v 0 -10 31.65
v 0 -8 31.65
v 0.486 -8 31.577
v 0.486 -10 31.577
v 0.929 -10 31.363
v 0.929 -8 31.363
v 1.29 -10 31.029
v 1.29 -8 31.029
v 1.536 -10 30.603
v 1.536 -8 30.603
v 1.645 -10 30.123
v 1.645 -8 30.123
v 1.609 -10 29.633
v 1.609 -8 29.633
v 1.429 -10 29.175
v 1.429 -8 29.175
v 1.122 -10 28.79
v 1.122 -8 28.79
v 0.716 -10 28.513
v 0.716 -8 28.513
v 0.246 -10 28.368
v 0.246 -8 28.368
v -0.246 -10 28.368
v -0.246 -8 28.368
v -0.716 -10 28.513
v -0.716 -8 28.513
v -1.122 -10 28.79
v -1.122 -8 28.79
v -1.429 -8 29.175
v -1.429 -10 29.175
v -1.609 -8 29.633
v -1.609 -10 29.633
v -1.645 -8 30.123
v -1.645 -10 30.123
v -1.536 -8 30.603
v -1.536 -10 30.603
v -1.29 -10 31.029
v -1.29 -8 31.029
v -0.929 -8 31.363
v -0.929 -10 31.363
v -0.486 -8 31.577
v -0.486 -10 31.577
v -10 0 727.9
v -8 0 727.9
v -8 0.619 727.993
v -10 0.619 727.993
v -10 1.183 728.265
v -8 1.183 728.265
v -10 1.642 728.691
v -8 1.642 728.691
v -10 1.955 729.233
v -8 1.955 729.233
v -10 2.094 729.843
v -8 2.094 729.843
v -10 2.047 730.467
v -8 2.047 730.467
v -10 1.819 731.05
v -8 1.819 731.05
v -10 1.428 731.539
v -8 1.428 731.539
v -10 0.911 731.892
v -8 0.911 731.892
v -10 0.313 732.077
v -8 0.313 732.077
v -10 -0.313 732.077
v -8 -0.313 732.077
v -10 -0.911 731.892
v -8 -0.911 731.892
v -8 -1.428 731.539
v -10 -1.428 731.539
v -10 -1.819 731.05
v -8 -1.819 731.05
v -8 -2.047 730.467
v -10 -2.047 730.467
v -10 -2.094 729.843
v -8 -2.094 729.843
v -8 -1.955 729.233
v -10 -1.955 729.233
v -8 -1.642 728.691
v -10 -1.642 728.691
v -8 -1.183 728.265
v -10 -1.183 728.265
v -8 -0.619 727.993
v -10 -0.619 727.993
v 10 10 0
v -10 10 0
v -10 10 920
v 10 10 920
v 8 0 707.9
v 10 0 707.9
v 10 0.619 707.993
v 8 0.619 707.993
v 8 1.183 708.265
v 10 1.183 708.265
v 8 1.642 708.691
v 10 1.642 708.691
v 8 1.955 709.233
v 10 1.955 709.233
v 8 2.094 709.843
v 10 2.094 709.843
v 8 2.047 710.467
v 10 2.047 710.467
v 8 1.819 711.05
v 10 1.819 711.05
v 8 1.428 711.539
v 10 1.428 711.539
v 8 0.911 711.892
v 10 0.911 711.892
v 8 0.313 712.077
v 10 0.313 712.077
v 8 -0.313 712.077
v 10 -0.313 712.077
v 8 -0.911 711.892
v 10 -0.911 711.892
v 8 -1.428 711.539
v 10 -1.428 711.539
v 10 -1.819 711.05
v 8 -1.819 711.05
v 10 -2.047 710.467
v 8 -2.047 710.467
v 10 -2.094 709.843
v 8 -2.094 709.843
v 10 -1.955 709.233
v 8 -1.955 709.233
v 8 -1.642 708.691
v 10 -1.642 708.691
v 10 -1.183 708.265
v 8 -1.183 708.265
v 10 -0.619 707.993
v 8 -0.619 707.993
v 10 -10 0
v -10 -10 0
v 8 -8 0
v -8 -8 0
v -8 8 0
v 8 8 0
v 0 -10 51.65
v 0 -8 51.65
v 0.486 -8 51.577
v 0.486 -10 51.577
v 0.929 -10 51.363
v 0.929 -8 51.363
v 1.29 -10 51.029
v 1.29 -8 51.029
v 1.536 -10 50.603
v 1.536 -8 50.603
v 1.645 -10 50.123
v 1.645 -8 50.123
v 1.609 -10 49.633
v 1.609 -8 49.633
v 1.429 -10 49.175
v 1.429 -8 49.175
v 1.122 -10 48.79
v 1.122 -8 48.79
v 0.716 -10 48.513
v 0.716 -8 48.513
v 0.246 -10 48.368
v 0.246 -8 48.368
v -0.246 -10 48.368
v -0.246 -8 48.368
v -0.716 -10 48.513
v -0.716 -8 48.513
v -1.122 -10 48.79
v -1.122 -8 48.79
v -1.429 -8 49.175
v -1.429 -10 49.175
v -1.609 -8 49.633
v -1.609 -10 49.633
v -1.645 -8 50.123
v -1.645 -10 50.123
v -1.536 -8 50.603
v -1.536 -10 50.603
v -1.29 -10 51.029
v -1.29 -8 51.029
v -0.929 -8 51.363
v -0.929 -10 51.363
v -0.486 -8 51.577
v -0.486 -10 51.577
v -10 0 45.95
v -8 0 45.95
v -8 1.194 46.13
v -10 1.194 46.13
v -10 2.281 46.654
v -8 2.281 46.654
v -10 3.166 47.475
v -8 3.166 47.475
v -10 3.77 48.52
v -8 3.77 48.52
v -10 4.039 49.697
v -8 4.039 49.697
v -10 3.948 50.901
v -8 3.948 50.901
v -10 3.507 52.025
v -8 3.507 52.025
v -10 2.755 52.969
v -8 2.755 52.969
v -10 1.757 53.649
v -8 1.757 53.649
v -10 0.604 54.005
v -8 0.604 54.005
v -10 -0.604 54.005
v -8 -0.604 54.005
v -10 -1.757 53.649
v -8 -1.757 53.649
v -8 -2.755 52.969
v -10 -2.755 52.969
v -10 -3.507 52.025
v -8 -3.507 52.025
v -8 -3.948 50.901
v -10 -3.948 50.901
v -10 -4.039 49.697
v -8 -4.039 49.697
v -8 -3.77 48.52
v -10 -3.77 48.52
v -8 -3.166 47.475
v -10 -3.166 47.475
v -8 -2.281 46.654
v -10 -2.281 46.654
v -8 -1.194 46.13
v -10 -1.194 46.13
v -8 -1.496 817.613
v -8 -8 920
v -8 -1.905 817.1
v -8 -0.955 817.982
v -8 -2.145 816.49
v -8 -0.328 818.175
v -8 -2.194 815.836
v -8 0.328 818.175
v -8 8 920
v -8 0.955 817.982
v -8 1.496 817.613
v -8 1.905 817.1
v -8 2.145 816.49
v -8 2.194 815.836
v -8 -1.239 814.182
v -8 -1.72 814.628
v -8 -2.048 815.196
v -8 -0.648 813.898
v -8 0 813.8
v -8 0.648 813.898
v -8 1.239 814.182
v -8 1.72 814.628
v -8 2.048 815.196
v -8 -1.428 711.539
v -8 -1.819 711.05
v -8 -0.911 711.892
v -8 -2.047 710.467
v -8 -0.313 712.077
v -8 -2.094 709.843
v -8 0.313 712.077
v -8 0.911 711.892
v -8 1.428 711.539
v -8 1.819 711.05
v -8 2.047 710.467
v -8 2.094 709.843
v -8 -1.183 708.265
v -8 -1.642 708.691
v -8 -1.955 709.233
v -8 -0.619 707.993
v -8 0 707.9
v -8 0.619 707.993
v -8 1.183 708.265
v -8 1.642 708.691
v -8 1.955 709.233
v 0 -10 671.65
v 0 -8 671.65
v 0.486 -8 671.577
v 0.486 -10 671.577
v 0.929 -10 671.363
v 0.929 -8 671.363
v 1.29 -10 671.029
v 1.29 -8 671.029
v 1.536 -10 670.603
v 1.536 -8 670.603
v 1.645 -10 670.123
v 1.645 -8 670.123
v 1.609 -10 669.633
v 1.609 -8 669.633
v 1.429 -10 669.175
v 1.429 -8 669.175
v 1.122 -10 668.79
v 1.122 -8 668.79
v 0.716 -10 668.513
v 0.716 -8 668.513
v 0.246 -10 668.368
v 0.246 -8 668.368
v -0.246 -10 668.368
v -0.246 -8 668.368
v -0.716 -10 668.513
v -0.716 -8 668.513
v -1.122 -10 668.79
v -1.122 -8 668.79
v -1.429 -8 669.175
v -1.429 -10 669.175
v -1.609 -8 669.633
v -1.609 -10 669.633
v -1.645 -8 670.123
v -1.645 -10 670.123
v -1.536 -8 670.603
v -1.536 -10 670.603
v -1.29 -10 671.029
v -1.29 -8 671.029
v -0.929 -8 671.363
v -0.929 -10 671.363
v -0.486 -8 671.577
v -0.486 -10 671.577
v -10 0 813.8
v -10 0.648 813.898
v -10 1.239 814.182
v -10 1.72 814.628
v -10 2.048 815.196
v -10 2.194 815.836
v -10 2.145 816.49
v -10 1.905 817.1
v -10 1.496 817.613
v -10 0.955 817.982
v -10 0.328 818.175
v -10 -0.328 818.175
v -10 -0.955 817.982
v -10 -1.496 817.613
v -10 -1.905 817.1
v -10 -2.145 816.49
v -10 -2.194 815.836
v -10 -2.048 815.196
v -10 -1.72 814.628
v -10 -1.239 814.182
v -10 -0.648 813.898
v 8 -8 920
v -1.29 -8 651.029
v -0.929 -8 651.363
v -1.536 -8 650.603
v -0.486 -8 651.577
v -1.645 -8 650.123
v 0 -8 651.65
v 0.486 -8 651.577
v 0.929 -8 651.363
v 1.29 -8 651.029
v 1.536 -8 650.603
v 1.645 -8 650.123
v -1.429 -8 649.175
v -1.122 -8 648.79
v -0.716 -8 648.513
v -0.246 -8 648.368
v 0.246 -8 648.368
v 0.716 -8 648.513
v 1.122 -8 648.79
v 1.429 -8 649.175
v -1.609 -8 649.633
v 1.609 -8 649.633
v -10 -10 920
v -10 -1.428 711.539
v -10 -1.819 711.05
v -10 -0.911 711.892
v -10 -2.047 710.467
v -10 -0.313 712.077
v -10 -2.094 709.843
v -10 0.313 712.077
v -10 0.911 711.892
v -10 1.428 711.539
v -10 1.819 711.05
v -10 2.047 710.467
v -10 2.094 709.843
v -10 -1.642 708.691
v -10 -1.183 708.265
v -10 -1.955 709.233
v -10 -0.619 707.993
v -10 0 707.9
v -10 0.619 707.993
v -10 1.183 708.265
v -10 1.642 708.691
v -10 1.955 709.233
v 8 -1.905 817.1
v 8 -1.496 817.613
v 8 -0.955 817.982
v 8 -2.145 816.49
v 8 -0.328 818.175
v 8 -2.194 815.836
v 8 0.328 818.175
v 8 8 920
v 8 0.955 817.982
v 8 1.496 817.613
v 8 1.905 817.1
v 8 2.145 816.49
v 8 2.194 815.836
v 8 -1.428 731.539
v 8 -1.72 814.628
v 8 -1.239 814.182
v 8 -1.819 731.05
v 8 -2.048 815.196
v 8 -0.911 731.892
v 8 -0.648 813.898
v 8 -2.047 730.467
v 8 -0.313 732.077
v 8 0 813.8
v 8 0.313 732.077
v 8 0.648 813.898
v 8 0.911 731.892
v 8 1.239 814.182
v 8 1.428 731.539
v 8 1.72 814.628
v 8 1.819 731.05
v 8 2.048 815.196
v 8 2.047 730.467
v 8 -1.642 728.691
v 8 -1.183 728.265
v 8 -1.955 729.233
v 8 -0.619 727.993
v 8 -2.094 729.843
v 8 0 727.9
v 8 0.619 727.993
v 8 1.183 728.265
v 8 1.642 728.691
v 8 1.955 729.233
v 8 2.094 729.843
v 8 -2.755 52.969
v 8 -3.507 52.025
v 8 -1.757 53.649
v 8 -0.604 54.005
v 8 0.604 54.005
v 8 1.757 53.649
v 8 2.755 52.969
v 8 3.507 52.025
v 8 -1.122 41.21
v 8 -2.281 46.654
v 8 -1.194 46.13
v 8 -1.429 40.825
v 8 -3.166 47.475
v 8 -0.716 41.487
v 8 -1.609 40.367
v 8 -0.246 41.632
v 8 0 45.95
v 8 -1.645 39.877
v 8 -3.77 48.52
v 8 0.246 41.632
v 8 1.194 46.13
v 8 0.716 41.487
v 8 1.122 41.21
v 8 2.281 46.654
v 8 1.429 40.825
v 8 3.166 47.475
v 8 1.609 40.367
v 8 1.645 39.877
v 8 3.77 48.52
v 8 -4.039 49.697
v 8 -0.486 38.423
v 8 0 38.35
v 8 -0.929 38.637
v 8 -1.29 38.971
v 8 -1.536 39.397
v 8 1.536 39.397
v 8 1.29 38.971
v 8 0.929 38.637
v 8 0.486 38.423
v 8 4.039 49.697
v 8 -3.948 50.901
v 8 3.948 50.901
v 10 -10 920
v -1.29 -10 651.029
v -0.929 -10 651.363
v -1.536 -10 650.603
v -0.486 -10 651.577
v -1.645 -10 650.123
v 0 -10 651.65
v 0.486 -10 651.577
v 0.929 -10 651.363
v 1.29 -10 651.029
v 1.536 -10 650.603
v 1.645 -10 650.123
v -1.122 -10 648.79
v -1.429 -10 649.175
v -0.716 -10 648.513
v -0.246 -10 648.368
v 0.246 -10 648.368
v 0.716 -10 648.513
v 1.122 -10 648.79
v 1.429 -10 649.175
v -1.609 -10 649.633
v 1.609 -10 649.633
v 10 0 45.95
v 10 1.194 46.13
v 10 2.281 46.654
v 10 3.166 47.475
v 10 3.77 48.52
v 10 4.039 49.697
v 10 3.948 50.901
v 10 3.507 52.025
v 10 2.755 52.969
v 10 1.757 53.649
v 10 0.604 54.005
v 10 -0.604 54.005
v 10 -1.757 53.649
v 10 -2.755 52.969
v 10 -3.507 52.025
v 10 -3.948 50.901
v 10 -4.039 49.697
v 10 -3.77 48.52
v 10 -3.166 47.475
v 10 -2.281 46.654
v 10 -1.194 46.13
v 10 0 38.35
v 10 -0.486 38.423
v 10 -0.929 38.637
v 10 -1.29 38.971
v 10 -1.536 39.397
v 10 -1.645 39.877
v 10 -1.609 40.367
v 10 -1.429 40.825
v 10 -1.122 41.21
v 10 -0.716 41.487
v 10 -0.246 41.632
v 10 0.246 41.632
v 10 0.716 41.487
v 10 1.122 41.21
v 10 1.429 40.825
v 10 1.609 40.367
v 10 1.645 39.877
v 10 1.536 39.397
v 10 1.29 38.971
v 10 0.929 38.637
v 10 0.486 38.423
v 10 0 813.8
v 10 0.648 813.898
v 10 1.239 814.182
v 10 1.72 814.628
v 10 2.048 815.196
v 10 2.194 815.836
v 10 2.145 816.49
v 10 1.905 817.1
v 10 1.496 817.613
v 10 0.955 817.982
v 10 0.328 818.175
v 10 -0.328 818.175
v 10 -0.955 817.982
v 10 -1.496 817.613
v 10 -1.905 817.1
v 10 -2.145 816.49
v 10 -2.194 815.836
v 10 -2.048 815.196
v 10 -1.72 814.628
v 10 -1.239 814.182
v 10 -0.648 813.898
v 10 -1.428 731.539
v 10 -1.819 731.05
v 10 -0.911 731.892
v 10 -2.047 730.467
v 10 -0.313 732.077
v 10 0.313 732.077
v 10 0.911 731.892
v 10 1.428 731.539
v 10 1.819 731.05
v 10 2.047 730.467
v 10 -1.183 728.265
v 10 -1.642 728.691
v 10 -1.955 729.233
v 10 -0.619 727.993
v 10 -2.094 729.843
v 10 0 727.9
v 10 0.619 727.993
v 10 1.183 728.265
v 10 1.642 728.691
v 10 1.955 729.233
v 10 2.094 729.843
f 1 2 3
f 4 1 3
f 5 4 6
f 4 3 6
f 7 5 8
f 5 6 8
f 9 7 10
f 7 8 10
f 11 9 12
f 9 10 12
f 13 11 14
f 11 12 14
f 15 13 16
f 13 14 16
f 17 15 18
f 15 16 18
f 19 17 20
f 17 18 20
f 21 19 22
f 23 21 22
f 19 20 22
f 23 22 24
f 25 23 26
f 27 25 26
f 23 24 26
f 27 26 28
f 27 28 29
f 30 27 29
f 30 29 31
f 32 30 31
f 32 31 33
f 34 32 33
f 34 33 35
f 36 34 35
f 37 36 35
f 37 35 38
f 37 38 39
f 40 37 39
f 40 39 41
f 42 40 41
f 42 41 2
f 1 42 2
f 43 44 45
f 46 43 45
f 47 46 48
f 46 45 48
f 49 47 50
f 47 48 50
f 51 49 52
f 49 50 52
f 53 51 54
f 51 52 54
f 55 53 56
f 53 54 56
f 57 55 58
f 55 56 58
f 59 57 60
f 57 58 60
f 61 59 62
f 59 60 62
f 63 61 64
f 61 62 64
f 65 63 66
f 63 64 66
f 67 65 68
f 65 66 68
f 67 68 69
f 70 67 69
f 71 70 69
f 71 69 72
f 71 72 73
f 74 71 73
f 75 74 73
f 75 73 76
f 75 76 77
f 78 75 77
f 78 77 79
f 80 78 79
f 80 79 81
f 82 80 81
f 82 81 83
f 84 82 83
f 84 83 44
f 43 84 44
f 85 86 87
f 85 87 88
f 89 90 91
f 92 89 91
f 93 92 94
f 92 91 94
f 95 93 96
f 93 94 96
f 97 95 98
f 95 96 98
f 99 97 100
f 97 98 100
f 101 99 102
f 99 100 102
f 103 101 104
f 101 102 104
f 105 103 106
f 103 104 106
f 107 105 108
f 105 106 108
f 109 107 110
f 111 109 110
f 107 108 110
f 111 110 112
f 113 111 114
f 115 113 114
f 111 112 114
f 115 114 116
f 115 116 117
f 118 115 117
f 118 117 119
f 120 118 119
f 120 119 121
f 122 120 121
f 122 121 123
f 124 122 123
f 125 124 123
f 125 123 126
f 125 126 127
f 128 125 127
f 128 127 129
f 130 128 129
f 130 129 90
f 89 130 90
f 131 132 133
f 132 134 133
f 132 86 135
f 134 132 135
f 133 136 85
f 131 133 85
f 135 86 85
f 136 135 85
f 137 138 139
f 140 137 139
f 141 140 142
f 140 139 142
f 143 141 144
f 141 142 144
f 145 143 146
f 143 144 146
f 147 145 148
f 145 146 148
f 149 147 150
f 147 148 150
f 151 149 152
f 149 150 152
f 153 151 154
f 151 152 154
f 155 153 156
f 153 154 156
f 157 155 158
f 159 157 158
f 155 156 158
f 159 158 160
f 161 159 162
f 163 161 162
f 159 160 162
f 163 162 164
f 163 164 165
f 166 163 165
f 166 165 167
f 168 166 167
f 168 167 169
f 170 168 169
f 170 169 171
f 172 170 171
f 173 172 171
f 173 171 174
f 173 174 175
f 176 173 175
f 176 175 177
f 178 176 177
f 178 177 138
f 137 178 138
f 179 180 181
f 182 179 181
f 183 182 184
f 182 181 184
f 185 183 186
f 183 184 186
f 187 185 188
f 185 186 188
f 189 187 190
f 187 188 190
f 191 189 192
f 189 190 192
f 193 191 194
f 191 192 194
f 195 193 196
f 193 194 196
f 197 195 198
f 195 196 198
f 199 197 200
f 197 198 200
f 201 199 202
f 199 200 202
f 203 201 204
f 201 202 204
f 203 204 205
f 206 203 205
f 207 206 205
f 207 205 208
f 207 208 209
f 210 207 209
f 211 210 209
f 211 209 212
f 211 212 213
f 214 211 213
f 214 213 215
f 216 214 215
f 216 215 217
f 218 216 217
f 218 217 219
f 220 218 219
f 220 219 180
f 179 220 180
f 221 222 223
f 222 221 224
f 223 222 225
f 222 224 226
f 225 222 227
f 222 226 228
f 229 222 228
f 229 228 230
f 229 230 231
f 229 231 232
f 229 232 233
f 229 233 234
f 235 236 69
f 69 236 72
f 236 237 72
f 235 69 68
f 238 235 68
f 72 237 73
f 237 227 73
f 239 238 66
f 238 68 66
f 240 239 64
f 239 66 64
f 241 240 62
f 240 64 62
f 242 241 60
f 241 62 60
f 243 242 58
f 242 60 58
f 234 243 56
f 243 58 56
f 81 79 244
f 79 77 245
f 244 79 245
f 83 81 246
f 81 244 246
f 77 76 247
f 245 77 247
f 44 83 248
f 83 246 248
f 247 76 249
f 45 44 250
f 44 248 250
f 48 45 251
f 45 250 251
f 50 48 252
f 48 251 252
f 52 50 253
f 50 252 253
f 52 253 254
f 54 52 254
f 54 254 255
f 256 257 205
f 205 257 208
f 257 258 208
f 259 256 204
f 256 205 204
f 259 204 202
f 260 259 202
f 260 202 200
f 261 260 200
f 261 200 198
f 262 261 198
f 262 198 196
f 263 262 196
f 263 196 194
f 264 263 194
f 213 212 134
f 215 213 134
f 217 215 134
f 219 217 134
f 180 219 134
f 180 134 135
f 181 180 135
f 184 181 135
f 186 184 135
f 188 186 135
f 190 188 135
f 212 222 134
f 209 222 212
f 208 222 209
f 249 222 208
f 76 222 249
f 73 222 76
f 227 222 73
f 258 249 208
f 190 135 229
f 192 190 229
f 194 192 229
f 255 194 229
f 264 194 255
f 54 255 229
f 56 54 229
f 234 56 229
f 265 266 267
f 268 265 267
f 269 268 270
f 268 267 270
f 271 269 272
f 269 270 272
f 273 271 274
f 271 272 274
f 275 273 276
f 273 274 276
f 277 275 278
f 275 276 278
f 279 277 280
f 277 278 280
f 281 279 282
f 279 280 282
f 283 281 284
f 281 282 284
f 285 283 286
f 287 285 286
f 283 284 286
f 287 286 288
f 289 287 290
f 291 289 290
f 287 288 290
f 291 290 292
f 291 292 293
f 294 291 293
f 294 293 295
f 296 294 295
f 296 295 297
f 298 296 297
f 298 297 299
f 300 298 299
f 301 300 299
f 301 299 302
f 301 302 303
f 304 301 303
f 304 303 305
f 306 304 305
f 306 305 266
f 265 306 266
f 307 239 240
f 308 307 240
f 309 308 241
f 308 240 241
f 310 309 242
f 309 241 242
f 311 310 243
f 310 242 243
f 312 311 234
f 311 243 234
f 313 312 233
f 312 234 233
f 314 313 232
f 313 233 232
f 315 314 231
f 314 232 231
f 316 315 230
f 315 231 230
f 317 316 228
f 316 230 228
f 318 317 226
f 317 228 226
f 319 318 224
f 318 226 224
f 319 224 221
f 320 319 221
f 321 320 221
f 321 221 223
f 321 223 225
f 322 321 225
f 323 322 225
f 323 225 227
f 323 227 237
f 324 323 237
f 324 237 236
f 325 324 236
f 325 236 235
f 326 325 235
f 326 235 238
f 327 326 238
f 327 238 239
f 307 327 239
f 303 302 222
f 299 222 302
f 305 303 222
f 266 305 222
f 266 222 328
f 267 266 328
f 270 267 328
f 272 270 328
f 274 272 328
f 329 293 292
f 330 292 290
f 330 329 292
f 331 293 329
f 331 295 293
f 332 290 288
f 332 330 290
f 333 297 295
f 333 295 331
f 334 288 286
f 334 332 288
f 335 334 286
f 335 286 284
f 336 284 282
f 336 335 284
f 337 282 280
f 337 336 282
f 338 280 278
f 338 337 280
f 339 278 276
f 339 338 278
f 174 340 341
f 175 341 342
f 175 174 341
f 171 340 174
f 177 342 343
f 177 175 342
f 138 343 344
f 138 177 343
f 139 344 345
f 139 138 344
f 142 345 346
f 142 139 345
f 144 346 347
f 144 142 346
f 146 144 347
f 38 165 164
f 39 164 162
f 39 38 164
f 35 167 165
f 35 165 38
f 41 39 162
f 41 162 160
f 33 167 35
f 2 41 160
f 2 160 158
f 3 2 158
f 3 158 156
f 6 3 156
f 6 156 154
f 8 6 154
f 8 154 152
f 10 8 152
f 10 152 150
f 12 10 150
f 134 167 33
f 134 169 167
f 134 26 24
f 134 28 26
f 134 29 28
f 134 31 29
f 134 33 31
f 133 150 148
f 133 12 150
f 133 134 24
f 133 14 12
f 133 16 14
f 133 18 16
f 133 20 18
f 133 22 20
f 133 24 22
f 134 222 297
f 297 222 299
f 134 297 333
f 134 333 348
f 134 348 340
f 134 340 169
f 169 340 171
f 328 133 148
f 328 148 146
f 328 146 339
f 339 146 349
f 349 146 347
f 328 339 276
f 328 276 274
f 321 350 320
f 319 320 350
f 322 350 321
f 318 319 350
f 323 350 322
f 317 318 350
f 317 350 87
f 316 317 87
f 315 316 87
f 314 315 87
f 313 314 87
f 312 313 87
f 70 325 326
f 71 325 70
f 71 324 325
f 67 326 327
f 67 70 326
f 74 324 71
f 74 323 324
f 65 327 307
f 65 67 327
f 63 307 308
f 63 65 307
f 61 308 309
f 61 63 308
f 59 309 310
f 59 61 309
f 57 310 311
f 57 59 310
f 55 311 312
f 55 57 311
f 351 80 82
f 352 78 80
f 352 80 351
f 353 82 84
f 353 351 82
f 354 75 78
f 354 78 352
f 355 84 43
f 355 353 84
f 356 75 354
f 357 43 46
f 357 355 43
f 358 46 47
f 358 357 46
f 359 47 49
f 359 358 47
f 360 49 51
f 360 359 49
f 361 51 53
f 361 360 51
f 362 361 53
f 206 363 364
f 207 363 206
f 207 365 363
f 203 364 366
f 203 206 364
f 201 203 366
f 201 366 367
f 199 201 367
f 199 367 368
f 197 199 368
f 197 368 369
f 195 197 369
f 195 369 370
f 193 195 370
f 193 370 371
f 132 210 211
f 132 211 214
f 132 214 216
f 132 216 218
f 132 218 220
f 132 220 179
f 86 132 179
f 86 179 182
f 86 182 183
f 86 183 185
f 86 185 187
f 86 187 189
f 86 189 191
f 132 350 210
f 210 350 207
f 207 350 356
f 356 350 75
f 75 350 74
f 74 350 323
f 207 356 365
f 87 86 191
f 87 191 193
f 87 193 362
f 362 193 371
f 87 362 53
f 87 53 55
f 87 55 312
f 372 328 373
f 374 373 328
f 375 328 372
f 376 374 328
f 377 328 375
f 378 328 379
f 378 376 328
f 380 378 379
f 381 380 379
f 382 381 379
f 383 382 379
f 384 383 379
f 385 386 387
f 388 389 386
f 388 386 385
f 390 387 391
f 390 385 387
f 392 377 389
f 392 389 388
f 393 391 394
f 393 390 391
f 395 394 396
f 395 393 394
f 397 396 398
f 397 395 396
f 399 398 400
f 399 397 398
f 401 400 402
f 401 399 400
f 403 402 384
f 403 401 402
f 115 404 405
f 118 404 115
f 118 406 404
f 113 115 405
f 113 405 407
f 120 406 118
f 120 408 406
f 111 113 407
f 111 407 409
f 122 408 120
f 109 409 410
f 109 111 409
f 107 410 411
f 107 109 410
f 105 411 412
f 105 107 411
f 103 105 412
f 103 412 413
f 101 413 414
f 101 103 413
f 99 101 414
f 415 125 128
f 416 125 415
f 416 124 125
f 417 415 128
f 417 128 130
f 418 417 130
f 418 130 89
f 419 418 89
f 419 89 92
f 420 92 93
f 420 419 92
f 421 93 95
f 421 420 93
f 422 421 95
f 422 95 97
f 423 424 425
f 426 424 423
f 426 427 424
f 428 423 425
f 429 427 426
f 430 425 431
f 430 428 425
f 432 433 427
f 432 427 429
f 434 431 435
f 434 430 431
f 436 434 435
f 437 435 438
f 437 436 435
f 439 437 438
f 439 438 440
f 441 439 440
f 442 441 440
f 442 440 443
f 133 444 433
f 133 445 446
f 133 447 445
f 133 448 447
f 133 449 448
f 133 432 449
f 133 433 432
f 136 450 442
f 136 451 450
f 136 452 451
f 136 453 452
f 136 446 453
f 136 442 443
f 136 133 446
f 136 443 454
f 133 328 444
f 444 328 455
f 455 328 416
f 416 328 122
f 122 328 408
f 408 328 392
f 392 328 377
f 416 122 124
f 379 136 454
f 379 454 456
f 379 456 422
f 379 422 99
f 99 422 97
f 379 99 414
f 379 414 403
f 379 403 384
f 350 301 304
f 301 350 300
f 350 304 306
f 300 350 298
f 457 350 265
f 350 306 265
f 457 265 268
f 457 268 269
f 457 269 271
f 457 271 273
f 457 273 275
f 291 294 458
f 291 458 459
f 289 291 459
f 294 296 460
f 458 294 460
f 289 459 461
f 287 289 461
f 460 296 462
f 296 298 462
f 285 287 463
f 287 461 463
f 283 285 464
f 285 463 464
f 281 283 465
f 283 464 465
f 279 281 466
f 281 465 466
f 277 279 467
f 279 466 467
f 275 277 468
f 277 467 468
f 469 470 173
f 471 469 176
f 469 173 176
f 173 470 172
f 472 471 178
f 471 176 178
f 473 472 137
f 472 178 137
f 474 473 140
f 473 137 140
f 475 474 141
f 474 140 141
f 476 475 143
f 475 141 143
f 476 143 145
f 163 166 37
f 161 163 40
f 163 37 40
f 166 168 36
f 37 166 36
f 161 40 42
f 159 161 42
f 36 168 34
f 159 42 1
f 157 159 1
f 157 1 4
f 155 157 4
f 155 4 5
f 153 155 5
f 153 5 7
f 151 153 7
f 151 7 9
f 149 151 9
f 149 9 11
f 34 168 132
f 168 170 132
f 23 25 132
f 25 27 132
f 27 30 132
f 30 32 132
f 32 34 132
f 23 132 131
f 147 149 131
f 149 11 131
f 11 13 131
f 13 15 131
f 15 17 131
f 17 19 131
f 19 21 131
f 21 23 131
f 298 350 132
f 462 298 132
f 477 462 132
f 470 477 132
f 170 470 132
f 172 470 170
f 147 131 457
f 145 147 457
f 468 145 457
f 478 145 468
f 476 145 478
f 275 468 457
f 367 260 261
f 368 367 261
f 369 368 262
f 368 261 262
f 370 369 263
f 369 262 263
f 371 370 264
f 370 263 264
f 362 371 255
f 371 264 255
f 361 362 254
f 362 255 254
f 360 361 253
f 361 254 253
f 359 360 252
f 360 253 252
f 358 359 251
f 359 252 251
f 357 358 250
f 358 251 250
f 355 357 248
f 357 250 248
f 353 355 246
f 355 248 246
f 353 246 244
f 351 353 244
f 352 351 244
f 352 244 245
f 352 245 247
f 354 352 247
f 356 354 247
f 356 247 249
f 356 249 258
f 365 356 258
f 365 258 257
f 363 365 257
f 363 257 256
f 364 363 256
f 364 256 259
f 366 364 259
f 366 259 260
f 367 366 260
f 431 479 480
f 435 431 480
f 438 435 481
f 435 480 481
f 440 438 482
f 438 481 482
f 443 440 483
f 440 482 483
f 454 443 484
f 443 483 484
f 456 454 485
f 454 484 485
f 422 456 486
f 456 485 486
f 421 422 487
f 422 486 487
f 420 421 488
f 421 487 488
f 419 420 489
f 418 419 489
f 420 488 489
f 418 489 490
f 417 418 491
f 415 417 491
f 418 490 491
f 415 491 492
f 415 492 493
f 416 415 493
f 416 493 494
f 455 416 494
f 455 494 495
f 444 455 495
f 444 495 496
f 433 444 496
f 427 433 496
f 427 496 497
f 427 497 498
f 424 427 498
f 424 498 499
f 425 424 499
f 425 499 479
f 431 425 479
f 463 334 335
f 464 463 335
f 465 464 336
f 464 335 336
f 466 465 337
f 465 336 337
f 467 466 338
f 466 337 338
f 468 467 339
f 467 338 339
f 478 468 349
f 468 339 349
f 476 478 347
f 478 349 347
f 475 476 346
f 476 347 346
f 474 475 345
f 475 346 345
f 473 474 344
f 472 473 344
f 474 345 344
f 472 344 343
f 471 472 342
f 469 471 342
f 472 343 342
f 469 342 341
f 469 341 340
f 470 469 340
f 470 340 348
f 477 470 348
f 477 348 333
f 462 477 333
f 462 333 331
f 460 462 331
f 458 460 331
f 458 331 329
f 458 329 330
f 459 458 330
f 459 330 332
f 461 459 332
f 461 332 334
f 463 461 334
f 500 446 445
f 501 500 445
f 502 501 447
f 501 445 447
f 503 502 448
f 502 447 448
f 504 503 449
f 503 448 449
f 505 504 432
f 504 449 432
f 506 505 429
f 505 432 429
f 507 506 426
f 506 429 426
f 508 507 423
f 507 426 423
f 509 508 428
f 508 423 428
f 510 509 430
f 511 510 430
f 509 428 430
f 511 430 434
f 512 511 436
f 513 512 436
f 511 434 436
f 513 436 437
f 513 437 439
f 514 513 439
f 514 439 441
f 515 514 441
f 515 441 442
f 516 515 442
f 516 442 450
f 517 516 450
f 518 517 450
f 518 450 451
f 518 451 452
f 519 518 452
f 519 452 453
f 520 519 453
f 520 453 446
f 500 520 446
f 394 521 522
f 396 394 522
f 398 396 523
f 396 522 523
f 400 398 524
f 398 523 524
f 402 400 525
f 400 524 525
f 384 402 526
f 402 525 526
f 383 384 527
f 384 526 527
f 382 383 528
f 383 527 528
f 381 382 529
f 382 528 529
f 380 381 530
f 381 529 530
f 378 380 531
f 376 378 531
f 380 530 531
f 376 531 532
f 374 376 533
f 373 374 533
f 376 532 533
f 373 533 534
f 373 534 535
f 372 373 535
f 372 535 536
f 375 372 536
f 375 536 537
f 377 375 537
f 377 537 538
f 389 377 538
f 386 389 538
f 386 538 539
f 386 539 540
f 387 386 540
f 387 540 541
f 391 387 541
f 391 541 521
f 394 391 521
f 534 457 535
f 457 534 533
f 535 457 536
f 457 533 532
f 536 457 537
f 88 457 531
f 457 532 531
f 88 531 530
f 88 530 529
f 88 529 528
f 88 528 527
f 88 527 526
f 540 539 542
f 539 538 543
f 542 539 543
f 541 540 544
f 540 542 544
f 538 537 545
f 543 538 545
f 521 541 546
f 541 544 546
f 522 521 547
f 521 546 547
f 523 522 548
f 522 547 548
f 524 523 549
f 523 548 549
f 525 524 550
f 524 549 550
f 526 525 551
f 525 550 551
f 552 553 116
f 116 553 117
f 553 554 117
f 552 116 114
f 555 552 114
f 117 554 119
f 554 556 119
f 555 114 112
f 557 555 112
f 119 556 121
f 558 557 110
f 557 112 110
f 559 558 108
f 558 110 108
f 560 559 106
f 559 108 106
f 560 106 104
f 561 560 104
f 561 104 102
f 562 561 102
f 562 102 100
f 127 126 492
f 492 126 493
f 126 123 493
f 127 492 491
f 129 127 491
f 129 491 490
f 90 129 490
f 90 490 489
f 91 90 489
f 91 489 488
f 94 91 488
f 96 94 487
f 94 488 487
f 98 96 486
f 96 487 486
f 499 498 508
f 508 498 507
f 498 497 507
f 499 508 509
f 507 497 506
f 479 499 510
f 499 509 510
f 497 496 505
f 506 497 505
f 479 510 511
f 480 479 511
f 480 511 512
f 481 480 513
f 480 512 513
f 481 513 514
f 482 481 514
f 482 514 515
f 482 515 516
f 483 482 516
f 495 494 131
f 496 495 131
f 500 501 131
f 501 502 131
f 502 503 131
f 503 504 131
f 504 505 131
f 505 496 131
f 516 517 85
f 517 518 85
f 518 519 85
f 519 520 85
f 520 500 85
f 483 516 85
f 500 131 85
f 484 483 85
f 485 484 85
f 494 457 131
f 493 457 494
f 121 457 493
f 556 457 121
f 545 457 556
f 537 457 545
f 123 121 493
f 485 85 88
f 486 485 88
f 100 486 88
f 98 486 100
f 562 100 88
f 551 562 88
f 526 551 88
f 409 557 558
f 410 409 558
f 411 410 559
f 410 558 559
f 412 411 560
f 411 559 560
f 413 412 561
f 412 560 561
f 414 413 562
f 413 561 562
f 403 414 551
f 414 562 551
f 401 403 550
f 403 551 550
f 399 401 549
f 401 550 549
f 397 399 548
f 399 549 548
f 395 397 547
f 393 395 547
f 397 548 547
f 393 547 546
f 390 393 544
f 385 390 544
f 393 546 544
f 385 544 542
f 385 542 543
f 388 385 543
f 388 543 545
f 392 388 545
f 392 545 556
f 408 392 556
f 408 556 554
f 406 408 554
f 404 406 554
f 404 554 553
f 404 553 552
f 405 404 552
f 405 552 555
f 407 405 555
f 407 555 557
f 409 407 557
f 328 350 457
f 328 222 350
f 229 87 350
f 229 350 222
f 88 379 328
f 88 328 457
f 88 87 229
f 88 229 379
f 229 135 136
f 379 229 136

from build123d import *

# Parameters (mm, degrees)
SKETCH_1_W          = 20
SKETCH_1_H          = 20
SKETCH_1_W_2        = 16
SKETCH_1_H_2        = 16
EXTRUDE_1_DEPTH     = 970
SKETCH_2_R          = 4.05
CUT_EXTRUDE_1_DEPTH = 20
SKETCH_4_W          = 21.376287738
SKETCH_4_H          = 29.089038522
CUT_EXTRUDE_3_DEPTH = 50
SKETCH_5_R          = 2.2
CUT_EXTRUDE_4_DEPTH = 30
SKETCH_6_R          = 1
CUT_EXTRUDE_5_DEPTH = 10
M4X0_7_1_D          = 3.3
M4X0_7_1_DEPTH      = 11.5
M4X0_7_1_TIP        = 0.991420021
SKETCH_12_R         = 1
CUT_EXTRUDE_7_DEPTH = 10
M4X0_7_6_D          = 3.3
M4X0_7_6_DEPTH      = 11.5
M4X0_7_6_TIP        = 0.991420021
SKETCH_15_R         = 2.1
CUT_EXTRUDE_8_DEPTH = 21
SKETCH_16_R         = 1
CUT_EXTRUDE_9_DEPTH = 10
M4X0_7_7_D          = 3.3
M4X0_7_7_DEPTH      = 11.5
M4X0_7_7_TIP        = 0.991420021


with BuildPart() as part:
    # ｽｹｯﾁ1 → ﾎﾞｽ - 押し出し1 (new body)
    with BuildSketch(Plane.XY):
        Rectangle(SKETCH_1_W, SKETCH_1_H)
        Rectangle(SKETCH_1_W_2, SKETCH_1_H_2, mode=Mode.SUBTRACT)
    extrude(amount=EXTRUDE_1_DEPTH)

    # ｽｹｯﾁ2 → ｶｯﾄ - 押し出し1 (cut)
    with BuildSketch(Plane(origin=(10, 0, 0), x_dir=(0, 0, -1), z_dir=(1, 0, 0))):
        with Locations((-50, 0)):
            Circle(SKETCH_2_R)
    extrude(amount=-CUT_EXTRUDE_1_DEPTH, mode=Mode.SUBTRACT)

    # ｽｹｯﾁ4 → ｶｯﾄ - 押し出し3 (cut)
    with BuildSketch(Plane.XY.offset(970)):
        Rectangle(SKETCH_4_W, SKETCH_4_H)
    extrude(amount=-CUT_EXTRUDE_3_DEPTH, mode=Mode.SUBTRACT)

    # ｽｹｯﾁ5 → ｶｯﾄ - 押し出し4 (cut)
    with BuildSketch(Plane(origin=(10, 0, 0), x_dir=(0, 0, -1), z_dir=(1, 0, 0))):
        with Locations((-816, 0)):
            Circle(SKETCH_5_R)
    extrude(amount=-CUT_EXTRUDE_4_DEPTH, mode=Mode.SUBTRACT)

    # ｽｹｯﾁ6 → ｶｯﾄ - 押し出し5 (cut)
    with BuildSketch(Plane.XZ.offset(10)):
        with Locations((0, 30)):
            Circle(SKETCH_6_R)
        with Locations((0, 50)):
            Circle(SKETCH_6_R)
    extrude(amount=-CUT_EXTRUDE_5_DEPTH, mode=Mode.SUBTRACT)

    # M4x0.7 ねじ穴1
    with Locations(Plane(origin=(0, -10, 30), x_dir=(0, 0, -1), z_dir=(0, -1, 0))):
        with Locations((0, 0), (-20, 0)):
            Hole(M4X0_7_1_D / 2, depth=M4X0_7_1_DEPTH)
            with Locations((0, 0, -(M4X0_7_1_DEPTH + M4X0_7_1_TIP / 2))):  # 118° drill point
                Cone(0, M4X0_7_1_D / 2, M4X0_7_1_TIP, mode=Mode.SUBTRACT)

    # ｽｹｯﾁ12 → ｶｯﾄ - 押し出し7 (cut)
    with BuildSketch(Plane(origin=(10, 0, 0), x_dir=(0, 0, -1), z_dir=(1, 0, 0))):
        with Locations((-40, 0)):
            Circle(SKETCH_12_R)
        with Locations((-710, 0)):
            Circle(SKETCH_12_R)
        with Locations((-730, 0)):
            Circle(SKETCH_12_R)
    extrude(amount=-CUT_EXTRUDE_7_DEPTH, mode=Mode.SUBTRACT)

    # M4x0.7 ねじ穴6
    with Locations(Plane(origin=(10, 0, 40), x_dir=(0, 0, 1), z_dir=(1, 0, 0))):
        with Locations((0, 0)):
            Hole(M4X0_7_6_D / 2, depth=M4X0_7_6_DEPTH)
            with Locations((0, 0, -(M4X0_7_6_DEPTH + M4X0_7_6_TIP / 2))):  # 118° drill point
                Cone(0, M4X0_7_6_D / 2, M4X0_7_6_TIP, mode=Mode.SUBTRACT)

    # ｽｹｯﾁ15 → ｶｯﾄ - 押し出し8 (cut, through all)
    with BuildSketch(Plane(origin=(10, 0, 0), x_dir=(0, 0, -1), z_dir=(1, 0, 0))):
        with Locations((-710, 0)):
            Circle(SKETCH_15_R)
        with Locations((-730, 0)):
            Circle(SKETCH_15_R)
    extrude(amount=-CUT_EXTRUDE_8_DEPTH, mode=Mode.SUBTRACT)

    # ｽｹｯﾁ16 → ｶｯﾄ - 押し出し9 (cut)
    with BuildSketch(Plane(origin=(0, -10, 0), x_dir=(-1, 0, 0), z_dir=(0, -1, 0))):
        with Locations((0, -670)):
            Circle(SKETCH_16_R)
        with Locations((0, -650)):
            Circle(SKETCH_16_R)
    extrude(amount=-CUT_EXTRUDE_9_DEPTH, mode=Mode.SUBTRACT)

    # M4x0.7 ねじ穴7
    with Locations(Plane(origin=(0, -10, 670), x_dir=(0, 0, -1), z_dir=(0, -1, 0))):
        with Locations((0, 0), (20, 0)):
            Hole(M4X0_7_7_D / 2, depth=M4X0_7_7_DEPTH)
            with Locations((0, 0, -(M4X0_7_7_DEPTH + M4X0_7_7_TIP / 2))):  # 118° drill point
                Cone(0, M4X0_7_7_D / 2, M4X0_7_7_TIP, mode=Mode.SUBTRACT)


solid = part.part
